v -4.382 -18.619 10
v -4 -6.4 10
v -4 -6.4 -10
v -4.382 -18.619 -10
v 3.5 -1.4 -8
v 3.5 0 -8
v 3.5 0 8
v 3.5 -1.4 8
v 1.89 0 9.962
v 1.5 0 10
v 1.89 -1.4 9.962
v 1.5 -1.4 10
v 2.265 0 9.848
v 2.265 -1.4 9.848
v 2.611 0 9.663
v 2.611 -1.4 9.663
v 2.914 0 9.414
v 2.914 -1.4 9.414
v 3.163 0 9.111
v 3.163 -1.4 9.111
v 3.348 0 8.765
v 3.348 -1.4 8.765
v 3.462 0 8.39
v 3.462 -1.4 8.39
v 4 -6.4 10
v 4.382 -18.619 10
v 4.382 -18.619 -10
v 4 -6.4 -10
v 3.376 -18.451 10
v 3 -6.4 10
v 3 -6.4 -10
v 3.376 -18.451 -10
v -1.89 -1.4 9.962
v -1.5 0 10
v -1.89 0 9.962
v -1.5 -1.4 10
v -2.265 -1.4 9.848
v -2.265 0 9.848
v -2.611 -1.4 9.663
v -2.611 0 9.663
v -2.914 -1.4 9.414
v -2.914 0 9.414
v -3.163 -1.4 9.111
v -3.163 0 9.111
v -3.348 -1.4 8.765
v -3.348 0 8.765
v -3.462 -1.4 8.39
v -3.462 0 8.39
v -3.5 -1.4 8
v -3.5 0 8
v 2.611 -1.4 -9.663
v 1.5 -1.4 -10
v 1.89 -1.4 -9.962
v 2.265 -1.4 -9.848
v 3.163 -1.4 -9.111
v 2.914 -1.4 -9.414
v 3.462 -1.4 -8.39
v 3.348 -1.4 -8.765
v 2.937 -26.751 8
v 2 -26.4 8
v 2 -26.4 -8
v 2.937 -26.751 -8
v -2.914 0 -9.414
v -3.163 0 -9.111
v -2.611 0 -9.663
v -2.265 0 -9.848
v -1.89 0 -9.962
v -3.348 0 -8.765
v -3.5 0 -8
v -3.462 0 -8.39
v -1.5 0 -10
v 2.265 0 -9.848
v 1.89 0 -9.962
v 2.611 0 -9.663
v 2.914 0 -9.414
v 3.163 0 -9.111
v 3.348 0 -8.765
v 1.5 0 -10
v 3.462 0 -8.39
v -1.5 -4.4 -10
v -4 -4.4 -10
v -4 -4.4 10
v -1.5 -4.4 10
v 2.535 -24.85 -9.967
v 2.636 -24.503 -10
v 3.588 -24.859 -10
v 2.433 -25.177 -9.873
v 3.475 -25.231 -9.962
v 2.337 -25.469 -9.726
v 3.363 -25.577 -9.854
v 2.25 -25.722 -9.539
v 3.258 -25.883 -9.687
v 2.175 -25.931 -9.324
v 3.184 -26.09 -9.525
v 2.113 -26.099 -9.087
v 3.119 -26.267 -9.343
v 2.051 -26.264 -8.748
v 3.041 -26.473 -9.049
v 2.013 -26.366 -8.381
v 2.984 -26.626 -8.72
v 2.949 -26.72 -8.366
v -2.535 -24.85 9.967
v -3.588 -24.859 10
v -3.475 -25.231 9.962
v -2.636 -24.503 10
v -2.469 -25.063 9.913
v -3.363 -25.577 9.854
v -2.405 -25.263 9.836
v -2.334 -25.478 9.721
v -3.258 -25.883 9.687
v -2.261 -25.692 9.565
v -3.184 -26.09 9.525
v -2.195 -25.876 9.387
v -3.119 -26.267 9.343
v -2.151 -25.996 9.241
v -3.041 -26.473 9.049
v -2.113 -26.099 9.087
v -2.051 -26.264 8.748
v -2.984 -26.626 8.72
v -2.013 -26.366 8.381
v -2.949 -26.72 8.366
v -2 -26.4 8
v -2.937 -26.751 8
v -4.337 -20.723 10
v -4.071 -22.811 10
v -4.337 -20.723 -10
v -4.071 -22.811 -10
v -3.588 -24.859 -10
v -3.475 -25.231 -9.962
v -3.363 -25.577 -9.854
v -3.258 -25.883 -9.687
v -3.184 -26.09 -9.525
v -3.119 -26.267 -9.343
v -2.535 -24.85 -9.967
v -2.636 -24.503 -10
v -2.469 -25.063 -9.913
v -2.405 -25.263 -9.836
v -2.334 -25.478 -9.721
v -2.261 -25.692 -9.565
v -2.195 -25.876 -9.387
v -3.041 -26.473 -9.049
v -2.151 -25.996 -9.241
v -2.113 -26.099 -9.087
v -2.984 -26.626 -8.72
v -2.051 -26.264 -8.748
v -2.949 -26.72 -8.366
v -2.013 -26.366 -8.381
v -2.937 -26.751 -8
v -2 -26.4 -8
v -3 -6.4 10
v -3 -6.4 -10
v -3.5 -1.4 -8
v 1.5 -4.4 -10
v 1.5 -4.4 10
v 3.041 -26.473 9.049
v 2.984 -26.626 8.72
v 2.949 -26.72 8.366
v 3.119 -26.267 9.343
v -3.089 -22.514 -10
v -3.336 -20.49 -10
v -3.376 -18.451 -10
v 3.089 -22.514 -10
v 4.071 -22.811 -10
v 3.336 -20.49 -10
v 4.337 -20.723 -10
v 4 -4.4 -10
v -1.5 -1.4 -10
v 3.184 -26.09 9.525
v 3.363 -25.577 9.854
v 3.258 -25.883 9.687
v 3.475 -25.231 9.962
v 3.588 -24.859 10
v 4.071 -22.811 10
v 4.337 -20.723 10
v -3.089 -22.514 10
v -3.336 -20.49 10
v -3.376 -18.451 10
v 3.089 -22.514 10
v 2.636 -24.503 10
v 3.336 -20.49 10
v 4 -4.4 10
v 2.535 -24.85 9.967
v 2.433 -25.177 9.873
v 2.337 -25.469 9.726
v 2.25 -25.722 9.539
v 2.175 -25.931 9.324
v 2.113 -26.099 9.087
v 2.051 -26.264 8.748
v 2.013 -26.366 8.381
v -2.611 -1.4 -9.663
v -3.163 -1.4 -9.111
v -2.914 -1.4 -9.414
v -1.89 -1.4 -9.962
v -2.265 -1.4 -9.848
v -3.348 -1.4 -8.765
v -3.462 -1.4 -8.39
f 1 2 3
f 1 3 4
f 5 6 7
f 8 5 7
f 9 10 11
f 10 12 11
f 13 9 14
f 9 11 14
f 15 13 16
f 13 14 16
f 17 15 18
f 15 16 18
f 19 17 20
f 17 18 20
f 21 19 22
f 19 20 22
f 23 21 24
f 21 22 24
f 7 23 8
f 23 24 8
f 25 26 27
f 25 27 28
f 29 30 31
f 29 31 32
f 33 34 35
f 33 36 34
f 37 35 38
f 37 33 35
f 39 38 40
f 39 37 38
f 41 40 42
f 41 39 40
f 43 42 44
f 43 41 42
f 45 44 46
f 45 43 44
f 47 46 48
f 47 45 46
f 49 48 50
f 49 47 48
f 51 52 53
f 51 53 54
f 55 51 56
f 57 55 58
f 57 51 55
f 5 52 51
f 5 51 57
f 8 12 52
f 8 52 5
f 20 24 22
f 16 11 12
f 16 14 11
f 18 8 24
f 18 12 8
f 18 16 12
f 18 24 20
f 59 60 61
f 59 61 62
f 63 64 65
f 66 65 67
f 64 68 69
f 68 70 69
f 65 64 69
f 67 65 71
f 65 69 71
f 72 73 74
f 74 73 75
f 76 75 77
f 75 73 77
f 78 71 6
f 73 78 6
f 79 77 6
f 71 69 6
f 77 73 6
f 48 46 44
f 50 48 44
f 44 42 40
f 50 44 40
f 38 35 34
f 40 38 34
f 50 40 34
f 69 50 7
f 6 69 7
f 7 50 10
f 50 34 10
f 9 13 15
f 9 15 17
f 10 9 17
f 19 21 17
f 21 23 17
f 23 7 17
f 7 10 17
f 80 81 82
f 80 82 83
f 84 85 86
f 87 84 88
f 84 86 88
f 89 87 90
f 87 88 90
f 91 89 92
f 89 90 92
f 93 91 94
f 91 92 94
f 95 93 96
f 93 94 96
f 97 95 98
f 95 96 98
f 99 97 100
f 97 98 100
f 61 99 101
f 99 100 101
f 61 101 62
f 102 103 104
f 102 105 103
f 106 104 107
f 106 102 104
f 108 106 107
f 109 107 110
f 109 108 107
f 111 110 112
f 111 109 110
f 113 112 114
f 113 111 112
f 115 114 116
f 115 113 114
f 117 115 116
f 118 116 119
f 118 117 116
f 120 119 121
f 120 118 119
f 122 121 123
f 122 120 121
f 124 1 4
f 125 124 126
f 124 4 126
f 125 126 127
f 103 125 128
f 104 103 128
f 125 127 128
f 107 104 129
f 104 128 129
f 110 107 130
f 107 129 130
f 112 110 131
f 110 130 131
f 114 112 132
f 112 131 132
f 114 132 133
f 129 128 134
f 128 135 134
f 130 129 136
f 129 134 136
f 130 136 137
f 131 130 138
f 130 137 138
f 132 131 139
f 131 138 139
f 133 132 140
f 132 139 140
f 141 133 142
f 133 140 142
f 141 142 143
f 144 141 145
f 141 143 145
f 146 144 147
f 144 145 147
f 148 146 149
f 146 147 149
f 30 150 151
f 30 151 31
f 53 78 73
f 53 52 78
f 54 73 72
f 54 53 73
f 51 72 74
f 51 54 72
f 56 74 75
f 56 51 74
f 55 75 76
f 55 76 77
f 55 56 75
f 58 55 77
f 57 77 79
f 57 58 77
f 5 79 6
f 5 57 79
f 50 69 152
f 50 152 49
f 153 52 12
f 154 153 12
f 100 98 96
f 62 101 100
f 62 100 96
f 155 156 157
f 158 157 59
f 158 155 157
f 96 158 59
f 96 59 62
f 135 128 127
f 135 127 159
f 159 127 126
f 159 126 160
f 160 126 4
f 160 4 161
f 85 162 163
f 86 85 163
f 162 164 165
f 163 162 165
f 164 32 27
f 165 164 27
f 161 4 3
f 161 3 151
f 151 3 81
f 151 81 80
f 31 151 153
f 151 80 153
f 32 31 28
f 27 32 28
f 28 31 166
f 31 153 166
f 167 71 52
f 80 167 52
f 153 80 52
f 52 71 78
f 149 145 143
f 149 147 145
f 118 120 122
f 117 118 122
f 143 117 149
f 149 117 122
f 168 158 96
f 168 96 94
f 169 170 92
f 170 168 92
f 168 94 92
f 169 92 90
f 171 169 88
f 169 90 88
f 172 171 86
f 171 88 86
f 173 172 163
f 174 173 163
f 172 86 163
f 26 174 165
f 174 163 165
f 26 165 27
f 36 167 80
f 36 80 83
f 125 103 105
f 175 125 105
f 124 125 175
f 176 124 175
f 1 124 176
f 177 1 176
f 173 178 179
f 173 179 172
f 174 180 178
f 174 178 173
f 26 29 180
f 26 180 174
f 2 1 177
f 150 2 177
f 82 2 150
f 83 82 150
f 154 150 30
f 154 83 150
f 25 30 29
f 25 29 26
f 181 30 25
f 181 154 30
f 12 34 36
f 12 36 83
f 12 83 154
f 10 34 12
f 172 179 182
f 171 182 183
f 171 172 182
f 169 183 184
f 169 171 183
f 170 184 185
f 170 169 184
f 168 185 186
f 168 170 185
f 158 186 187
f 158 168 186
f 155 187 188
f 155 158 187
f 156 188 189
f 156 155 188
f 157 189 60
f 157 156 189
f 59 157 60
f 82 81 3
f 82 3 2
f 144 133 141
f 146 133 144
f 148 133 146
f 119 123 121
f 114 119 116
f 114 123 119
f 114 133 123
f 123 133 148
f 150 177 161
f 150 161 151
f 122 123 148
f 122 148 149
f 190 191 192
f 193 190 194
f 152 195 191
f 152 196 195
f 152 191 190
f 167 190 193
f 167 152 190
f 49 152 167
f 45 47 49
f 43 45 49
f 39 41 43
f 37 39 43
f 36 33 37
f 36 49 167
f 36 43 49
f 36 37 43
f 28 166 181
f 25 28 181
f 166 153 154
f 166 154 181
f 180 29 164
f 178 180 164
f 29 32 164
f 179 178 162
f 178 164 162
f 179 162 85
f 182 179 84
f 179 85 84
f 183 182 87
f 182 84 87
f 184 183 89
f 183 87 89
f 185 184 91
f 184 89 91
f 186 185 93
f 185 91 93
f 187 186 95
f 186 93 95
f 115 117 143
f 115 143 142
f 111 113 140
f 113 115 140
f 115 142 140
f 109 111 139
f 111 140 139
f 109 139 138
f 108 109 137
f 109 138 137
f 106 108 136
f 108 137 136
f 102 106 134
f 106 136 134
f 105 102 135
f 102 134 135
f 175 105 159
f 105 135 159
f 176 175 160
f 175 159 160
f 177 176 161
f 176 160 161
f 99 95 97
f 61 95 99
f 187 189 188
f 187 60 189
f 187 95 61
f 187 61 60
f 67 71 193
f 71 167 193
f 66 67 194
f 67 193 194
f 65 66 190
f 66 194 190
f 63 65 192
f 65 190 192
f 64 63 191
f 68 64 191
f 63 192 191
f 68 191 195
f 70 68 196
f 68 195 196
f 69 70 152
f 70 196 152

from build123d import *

# Parameters (mm, degrees)
F0_W     = 7
F0_H     = 20
F1_DEPTH = 1.4
F2_W     = 3
F2_H     = 20
F3_DEPTH = 3
F4_W     = 8
F4_H     = 20
F5_DEPTH = 2
F8_DEPTH = 20
F9_R     = 20
F10_R    = 2


# Not quite as in the source:
# - a feature of the source that left no trace in its solid (it failed there, or was rolled back) is left out


with BuildPart() as f1:
    # F0 (on Front) → F1 (new body)
    with BuildSketch(Plane.XZ):
        Rectangle(F0_W, F0_H)
    extrude(amount=F1_DEPTH)

    # F2 (on face) → F3 (join)
    with BuildSketch(Plane.XZ.offset(1.4)):
        Rectangle(F2_W, F2_H)
    extrude(amount=F3_DEPTH)

    # F4 (on face) → F5 (join)
    with BuildSketch(Plane.XZ.offset(4.4)):
        Rectangle(F4_W, F4_H)
    extrude(amount=F5_DEPTH)

    # F7 (on face) → F8 (join, through all)
    with BuildSketch(Plane.XY.offset(10)):
        Polygon((-2.9995108826, -6.4), (-4, -6.4), (-4.5057272064, -22.5674550383), (-2.9367871525, -26.7512951822), (-2, -26.4), (-3.5, -22.4), align=None)
        Polygon((4, -6.4), (2.9995108826, -6.4), (3.5, -22.4), (2, -26.4), (2.9367871525, -26.7512951822), (4.5057272064, -22.5674550383), align=None)
    extrude(amount=-F8_DEPTH)

    # F9
    f9_edges = [f1.edges().sort_by_distance(p)[0] for p in [
        (-3.5, -22.4, 0),
        (3.5, -22.4, 0),
        (4.505727, -22.567455, 0),
        (-4.505727, -22.567455, 0),
    ]]
    fillet(f9_edges, radius=F9_R)

    # F10
    f10_edges = [f1.edges().sort_by_distance(p)[0] for p in [
        (-2.468394, -26.575648, 10),
        (2.468394, -26.575648, 10),
        (-2.468394, -26.575648, -10),
        (2.468394, -26.575648, -10),
        (-3.5, -0.7, -10),
        (3.5, -0.7, -10),
        (-3.5, -0.7, 10),
        (3.5, -0.7, 10),
    ]]
    fillet(f10_edges, radius=F10_R)


solid = f1.part
